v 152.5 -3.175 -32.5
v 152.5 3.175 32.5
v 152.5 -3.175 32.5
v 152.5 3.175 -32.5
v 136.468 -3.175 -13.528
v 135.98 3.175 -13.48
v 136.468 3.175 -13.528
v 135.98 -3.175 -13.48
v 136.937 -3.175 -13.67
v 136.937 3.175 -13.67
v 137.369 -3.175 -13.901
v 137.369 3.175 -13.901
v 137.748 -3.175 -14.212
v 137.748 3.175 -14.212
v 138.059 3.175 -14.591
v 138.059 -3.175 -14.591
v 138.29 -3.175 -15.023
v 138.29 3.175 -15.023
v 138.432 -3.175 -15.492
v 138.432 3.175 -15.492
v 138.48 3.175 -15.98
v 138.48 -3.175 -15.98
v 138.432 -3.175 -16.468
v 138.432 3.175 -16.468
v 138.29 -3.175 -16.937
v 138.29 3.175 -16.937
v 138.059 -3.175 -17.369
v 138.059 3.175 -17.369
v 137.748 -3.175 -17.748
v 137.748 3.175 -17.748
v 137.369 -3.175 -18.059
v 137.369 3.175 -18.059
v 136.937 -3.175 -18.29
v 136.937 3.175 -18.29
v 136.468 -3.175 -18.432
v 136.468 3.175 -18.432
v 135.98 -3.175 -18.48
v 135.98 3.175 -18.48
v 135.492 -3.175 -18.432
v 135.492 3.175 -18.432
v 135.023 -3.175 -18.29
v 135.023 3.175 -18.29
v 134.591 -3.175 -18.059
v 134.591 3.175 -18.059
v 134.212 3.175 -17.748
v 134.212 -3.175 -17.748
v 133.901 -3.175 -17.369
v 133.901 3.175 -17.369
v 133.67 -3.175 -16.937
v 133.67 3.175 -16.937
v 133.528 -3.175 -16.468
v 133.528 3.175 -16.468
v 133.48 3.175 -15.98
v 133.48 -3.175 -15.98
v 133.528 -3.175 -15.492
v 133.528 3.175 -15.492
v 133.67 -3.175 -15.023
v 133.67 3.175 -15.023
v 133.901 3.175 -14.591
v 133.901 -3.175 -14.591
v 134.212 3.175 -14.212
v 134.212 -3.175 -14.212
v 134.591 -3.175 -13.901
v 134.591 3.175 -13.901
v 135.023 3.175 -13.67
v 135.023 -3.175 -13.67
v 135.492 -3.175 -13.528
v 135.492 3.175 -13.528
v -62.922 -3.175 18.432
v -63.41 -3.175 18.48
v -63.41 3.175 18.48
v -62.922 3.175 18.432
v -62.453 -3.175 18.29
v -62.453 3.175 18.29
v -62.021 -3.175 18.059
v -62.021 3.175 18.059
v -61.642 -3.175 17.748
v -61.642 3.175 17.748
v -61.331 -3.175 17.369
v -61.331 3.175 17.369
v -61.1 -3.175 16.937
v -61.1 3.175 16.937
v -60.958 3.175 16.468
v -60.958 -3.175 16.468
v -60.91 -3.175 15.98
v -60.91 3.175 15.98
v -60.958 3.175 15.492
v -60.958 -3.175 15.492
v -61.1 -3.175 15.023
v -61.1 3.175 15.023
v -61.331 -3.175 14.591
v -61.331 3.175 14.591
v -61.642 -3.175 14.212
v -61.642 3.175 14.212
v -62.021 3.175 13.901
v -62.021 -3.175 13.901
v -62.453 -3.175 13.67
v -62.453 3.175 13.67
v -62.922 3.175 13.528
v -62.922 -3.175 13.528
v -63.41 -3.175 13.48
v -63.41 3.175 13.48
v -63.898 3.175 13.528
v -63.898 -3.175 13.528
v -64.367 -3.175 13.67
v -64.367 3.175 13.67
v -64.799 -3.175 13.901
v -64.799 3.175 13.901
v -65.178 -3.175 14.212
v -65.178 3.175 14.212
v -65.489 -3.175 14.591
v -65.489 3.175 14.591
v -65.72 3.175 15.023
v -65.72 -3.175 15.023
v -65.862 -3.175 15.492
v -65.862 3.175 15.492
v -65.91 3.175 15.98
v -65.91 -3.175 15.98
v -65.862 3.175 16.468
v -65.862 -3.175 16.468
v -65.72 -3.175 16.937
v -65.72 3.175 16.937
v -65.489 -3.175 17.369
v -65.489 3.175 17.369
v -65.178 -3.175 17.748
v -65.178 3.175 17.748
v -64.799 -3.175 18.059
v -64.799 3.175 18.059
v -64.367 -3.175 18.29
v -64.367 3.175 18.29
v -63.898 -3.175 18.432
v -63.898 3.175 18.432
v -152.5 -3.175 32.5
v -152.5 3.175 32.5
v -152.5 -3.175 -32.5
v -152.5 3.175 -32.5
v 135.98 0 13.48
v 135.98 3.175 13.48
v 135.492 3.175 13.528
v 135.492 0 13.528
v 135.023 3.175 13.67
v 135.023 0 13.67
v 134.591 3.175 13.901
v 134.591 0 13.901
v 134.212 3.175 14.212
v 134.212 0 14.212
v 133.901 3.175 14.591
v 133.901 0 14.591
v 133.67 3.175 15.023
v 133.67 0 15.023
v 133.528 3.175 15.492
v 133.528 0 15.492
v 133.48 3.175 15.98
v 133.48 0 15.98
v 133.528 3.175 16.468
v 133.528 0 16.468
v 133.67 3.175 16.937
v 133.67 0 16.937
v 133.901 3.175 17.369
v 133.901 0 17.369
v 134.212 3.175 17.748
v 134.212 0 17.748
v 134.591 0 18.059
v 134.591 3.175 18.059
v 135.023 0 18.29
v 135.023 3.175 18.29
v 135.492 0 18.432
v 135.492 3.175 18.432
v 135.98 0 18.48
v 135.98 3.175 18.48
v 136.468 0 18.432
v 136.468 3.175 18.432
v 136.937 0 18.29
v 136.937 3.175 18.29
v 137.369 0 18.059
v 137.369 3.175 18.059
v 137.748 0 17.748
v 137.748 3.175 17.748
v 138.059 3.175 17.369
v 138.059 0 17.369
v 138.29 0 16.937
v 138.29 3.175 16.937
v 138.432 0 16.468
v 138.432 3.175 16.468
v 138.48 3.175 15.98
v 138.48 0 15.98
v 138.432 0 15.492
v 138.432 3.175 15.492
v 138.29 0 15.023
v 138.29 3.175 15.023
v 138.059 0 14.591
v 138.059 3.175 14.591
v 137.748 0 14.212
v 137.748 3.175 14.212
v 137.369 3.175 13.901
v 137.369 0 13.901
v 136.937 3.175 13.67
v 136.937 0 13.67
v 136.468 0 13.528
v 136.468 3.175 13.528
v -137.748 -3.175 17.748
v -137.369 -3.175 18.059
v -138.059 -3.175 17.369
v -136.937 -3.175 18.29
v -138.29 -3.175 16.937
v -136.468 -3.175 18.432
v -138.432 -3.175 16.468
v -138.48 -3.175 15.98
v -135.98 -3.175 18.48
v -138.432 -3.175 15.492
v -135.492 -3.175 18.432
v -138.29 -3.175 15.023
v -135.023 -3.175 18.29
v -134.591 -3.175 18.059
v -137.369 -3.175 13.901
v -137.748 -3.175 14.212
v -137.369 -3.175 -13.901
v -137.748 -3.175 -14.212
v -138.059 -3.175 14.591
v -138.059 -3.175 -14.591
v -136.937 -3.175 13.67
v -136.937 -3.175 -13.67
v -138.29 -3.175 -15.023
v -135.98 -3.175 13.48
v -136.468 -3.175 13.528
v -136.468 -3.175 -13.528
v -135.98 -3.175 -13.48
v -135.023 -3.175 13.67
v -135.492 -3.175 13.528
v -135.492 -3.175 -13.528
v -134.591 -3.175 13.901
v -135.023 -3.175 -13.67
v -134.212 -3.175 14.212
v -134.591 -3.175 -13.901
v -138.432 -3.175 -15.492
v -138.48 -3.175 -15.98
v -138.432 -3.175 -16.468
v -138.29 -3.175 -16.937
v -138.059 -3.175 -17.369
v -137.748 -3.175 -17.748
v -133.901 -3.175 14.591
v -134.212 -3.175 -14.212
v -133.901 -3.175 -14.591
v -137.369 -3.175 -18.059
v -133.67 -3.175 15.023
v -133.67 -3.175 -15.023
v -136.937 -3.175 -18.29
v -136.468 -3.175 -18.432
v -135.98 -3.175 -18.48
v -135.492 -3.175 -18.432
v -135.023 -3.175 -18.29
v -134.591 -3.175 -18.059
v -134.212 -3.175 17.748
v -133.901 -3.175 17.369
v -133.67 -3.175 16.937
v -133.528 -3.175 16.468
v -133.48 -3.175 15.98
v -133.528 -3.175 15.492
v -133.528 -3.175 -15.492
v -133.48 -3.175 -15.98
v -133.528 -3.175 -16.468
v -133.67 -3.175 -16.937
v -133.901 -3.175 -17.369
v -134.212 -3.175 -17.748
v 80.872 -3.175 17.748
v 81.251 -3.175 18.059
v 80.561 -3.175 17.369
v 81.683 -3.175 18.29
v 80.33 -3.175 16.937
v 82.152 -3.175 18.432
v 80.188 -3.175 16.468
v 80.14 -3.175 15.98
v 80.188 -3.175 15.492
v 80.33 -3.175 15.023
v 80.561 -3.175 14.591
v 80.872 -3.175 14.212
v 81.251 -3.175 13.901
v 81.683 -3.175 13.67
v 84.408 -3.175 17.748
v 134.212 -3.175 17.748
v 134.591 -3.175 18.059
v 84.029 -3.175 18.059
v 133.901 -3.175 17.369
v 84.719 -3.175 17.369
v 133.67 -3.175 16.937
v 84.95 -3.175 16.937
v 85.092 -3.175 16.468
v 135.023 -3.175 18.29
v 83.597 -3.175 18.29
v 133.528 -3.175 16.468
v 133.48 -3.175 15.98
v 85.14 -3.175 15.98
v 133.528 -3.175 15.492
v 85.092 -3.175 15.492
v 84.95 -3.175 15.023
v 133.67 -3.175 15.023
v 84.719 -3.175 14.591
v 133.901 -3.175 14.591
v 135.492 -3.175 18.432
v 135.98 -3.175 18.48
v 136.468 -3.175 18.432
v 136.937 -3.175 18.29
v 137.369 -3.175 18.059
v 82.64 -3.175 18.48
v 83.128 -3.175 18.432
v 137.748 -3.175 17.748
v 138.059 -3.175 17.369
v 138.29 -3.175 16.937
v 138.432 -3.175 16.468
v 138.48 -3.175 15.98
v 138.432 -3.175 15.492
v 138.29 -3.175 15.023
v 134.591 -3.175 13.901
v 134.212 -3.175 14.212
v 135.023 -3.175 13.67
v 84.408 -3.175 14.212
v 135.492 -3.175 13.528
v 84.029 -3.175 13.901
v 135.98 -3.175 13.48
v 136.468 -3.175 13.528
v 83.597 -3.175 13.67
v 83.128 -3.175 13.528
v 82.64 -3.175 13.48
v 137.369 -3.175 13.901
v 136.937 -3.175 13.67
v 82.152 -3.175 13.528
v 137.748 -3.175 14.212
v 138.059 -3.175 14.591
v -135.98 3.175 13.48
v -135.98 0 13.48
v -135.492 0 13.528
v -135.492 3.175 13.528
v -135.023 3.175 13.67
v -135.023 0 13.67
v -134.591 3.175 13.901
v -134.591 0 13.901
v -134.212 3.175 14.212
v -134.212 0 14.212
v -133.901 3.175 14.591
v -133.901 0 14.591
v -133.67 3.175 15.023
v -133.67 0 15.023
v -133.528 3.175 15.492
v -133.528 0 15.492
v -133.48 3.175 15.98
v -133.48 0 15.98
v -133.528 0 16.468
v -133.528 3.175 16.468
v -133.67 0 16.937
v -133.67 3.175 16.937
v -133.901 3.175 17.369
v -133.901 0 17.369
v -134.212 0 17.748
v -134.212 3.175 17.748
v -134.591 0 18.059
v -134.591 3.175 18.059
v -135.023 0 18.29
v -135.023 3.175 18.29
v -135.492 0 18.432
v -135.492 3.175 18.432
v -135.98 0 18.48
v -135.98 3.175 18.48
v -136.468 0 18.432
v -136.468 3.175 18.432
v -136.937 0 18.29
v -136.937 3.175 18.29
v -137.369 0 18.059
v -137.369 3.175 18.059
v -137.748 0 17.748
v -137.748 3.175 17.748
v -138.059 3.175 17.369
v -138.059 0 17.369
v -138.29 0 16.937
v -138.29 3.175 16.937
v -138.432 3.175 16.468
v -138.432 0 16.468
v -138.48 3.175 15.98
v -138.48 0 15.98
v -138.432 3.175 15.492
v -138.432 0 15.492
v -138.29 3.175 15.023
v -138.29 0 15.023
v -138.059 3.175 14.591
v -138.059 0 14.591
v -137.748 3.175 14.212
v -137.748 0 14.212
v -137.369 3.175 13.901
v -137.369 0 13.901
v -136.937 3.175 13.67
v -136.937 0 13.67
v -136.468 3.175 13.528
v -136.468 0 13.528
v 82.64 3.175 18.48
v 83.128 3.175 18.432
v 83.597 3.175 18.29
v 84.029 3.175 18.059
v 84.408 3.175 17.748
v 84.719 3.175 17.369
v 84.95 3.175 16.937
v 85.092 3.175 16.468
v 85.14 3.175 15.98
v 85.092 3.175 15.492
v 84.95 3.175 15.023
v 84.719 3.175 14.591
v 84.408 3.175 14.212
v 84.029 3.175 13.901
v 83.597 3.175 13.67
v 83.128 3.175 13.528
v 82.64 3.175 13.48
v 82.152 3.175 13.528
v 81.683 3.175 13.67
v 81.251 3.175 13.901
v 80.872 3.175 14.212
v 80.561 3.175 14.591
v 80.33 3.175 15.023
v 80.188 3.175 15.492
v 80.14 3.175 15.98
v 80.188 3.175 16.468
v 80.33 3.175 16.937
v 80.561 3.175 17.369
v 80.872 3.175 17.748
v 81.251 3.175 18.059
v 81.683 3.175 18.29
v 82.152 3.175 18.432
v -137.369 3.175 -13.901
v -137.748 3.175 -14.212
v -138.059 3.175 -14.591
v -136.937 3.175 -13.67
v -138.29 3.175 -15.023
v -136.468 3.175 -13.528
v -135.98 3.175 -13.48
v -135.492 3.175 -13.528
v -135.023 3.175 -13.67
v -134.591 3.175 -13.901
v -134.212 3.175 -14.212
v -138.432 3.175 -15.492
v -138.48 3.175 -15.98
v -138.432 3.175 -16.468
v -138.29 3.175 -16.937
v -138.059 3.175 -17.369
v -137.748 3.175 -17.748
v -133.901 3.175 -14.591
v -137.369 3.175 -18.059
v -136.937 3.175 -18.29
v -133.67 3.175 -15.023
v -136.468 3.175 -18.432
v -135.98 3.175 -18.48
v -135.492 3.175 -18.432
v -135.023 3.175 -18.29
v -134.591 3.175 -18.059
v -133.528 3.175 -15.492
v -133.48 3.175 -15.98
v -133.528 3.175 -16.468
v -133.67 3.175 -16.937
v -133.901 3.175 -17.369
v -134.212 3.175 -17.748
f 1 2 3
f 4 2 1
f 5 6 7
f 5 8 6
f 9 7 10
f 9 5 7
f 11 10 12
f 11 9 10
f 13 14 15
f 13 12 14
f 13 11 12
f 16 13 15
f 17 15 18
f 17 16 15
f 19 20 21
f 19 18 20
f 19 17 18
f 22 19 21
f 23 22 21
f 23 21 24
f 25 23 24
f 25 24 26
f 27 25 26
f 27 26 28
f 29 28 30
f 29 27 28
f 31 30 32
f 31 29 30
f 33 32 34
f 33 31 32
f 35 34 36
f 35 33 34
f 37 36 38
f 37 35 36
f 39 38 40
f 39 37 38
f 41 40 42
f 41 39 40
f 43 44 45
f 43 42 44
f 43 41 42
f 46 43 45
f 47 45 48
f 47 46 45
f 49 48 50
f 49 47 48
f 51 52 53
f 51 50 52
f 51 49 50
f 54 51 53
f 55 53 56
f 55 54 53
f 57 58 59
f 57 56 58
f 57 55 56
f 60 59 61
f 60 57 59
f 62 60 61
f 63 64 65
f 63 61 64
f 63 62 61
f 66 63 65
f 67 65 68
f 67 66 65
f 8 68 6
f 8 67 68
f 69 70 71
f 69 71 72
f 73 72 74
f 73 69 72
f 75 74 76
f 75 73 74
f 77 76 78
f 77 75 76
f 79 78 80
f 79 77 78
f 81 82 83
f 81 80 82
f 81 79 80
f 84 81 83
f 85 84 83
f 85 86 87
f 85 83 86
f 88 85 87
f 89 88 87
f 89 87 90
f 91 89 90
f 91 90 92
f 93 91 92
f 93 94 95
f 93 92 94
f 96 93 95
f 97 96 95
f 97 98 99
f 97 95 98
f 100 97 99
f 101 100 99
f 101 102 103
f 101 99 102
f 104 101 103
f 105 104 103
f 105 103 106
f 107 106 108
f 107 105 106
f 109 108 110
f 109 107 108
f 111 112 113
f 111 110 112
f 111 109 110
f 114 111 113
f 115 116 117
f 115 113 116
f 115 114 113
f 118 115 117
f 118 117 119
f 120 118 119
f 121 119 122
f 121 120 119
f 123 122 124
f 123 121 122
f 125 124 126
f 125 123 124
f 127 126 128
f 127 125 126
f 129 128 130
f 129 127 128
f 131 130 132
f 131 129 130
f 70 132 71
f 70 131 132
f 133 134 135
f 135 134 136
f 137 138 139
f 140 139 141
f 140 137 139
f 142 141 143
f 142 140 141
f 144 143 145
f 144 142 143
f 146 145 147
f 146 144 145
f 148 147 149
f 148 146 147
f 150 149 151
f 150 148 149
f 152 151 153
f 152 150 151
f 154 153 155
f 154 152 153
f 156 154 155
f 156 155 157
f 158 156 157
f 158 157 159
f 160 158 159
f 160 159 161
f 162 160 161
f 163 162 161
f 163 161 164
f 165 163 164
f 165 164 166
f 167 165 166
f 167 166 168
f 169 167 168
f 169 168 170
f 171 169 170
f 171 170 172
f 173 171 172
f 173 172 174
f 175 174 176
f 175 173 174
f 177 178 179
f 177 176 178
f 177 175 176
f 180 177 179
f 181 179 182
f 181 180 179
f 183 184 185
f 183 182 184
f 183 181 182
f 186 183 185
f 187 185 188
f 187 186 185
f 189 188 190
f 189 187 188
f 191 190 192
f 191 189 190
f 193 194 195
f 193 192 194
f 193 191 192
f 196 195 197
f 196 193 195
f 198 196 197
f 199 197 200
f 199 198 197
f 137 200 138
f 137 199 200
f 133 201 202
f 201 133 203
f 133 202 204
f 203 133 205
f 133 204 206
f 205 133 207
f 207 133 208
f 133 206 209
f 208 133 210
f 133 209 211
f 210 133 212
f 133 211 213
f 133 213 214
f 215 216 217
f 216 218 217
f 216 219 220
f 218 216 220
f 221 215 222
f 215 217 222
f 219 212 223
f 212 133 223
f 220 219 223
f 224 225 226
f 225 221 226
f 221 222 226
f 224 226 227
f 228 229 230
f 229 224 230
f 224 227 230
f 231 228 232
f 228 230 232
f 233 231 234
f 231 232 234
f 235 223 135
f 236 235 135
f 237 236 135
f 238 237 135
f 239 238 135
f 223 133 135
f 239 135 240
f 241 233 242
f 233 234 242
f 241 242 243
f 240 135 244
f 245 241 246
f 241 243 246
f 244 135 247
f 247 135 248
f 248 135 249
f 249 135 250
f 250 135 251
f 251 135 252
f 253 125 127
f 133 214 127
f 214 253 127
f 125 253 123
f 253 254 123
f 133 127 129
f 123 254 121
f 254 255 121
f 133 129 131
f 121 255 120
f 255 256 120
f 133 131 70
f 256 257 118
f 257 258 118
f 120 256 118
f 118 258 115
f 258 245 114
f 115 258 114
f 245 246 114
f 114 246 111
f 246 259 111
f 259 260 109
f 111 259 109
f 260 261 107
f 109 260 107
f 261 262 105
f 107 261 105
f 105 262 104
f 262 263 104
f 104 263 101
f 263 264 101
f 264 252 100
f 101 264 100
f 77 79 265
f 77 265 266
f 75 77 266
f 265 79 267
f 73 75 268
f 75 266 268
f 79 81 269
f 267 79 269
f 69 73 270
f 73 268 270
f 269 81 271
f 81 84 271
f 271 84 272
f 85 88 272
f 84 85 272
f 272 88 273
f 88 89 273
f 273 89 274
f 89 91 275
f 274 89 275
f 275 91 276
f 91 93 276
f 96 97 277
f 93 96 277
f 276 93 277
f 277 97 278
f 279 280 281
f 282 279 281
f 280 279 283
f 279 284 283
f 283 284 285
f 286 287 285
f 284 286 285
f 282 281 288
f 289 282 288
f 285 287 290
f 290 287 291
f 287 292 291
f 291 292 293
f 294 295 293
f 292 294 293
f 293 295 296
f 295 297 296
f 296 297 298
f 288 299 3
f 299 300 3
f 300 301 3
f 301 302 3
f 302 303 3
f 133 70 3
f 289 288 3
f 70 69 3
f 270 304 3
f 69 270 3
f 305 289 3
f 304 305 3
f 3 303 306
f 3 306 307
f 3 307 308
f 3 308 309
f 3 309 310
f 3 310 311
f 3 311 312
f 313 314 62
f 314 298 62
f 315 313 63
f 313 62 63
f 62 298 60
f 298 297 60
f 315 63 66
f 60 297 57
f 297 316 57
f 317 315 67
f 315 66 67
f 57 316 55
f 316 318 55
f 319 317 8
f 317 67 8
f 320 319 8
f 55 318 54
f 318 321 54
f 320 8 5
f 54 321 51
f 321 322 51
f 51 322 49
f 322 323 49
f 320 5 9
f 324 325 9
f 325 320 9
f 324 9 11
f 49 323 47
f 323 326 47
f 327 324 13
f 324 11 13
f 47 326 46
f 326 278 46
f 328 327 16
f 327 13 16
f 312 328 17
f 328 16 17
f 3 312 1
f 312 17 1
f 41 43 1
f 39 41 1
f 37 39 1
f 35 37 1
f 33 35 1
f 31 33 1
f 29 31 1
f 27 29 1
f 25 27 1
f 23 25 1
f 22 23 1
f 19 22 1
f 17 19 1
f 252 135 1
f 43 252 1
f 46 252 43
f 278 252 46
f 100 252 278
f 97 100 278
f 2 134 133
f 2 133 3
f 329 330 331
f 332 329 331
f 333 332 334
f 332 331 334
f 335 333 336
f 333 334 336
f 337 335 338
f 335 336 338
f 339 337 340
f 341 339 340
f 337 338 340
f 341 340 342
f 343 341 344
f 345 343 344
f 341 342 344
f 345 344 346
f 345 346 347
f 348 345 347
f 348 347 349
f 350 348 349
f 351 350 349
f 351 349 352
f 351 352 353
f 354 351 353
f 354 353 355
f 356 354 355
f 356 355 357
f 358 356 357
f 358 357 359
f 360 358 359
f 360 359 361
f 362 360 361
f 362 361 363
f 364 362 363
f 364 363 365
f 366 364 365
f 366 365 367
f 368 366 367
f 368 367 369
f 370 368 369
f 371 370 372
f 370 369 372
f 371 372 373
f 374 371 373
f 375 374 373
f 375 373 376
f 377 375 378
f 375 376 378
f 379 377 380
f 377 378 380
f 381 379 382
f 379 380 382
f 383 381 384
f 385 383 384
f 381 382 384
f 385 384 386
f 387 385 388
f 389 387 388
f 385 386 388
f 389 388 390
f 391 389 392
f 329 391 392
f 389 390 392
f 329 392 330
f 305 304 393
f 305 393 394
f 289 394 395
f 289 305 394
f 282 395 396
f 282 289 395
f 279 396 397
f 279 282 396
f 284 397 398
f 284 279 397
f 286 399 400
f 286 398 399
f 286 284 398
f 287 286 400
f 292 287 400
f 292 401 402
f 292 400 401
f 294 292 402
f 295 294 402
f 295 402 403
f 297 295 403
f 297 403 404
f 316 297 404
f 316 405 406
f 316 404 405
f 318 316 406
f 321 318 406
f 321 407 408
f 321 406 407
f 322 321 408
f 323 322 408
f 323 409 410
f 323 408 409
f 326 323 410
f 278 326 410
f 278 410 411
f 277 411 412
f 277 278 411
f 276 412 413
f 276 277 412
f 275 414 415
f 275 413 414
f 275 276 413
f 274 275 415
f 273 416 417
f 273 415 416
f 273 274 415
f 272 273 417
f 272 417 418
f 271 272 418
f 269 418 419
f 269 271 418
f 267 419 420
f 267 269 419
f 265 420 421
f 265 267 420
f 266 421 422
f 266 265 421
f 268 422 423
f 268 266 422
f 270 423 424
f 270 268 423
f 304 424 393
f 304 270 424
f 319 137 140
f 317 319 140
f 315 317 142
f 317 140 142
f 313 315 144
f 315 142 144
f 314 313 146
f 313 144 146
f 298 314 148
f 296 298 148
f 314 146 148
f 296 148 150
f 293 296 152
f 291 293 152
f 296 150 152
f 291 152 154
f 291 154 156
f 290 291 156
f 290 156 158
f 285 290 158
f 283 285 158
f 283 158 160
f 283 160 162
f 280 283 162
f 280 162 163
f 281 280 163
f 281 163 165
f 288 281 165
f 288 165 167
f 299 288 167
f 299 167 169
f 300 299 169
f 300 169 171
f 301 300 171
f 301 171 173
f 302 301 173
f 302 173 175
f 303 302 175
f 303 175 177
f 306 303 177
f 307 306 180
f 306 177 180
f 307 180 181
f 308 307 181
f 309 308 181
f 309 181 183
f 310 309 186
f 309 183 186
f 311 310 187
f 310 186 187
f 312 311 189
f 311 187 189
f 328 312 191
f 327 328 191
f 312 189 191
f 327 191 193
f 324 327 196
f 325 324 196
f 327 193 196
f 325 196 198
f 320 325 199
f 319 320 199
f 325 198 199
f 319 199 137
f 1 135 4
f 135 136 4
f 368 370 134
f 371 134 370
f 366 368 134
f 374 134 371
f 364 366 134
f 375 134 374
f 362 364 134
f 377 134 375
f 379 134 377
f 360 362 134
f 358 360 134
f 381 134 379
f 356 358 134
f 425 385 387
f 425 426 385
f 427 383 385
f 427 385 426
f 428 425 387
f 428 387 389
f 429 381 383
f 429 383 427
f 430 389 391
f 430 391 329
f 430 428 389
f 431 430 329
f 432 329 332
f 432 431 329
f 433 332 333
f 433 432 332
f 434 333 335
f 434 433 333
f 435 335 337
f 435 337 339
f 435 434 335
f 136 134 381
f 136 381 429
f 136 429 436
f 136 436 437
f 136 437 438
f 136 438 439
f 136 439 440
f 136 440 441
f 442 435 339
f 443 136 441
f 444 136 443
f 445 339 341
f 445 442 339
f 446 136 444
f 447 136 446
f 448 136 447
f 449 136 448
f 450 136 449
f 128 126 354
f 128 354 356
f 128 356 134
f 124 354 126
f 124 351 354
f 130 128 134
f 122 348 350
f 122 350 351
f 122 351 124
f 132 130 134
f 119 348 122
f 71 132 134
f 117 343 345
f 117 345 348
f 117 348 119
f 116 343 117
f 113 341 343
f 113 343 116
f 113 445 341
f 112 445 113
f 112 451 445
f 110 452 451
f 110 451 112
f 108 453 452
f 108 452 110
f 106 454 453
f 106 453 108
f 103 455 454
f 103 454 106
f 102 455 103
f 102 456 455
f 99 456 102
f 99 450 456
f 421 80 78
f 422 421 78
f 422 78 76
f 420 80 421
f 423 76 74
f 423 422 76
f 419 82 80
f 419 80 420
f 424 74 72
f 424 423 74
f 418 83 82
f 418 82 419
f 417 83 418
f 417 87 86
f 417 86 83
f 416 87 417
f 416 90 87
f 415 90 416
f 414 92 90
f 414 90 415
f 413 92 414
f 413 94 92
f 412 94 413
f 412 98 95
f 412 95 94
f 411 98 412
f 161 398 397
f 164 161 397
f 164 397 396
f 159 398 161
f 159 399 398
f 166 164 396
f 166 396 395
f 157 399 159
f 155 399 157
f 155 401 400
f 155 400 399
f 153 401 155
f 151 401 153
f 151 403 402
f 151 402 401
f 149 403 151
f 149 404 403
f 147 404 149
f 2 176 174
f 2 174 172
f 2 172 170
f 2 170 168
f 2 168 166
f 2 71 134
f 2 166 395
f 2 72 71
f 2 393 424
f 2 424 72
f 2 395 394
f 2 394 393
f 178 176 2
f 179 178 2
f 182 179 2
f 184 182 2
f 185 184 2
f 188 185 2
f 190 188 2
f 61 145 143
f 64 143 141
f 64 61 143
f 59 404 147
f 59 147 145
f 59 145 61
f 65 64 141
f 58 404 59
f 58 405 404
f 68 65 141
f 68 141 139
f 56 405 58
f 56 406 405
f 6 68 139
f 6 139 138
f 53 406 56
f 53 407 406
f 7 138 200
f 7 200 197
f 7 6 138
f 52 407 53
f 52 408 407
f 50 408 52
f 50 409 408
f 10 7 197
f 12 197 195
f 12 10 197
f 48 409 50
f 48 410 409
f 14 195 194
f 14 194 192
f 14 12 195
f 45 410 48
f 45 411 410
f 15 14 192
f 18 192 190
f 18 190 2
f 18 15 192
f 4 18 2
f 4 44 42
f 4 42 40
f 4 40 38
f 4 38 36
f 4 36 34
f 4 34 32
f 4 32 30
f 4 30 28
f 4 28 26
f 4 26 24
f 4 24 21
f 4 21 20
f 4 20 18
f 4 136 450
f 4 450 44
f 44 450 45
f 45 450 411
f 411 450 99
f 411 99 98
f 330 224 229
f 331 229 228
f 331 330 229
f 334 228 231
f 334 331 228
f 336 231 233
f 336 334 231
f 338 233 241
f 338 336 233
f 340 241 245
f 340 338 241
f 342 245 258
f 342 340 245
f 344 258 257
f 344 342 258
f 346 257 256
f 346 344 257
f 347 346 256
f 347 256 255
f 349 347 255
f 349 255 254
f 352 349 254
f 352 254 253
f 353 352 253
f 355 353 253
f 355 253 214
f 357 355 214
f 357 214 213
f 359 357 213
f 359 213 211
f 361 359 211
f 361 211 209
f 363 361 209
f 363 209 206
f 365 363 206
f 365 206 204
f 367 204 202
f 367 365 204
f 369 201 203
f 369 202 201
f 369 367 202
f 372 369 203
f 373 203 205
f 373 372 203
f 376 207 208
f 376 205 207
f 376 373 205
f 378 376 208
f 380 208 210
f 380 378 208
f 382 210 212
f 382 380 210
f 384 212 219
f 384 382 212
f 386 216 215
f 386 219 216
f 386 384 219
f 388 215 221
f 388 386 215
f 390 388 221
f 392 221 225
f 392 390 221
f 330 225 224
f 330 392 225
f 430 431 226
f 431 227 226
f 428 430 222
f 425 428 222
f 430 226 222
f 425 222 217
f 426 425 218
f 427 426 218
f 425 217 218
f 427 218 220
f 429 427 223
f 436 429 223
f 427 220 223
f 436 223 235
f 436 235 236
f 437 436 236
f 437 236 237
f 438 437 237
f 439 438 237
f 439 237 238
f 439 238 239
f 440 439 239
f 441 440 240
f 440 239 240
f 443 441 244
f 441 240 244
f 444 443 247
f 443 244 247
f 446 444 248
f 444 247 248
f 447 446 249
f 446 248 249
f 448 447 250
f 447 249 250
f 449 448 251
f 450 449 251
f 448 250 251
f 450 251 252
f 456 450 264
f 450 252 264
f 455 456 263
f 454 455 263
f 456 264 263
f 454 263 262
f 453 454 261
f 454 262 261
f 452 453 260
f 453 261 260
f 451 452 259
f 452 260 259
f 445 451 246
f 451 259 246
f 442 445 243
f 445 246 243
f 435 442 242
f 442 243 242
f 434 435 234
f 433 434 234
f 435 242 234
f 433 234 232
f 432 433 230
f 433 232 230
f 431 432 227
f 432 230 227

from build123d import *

# Parameters (mm, degrees)
SKETCH1_W               = 305
SKETCH1_H               = 65
BOSS_EXTRUDE1_DEPTH     = 3.175
SKETCH4_R               = 2.5
CUT_EXTRUDE2_DEPTH      = 159.40243251
CUT_EXTRUDE3_DEPTH      = 157.053908955
CUT_EXTRUDE3_DEPTH_BACK = 157.053908955
SKETCH5_R               = 2.5


with BuildPart() as part:
    # Sketch1 → Boss-Extrude1 (new, symmetric)
    with BuildSketch(Plane(origin=(0, 0, 0), x_dir=(1, 0, 0), z_dir=(0, 1, 0))):
        Rectangle(SKETCH1_W, SKETCH1_H)
    extrude(amount=BOSS_EXTRUDE1_DEPTH, both=True)

    # Sketch4 → Cut-Extrude2 (cut, symmetric)
    with BuildSketch(Plane(origin=(-2.5, 0, 0), x_dir=(-1, 0, 0), z_dir=(0, -1, 0))):
        with Locations(Location((133.48, -15.98, 0), (0, 0, 90))):
            Circle(SKETCH4_R)
        with Locations(Location((133.48, 15.98, 0), (0, 0, 270))):
            Circle(SKETCH4_R)
    cut_extrude2 = extrude(amount=CUT_EXTRUDE2_DEPTH, both=True, mode=Mode.SUBTRACT)

    # Mirror2: Cut-Extrude2 across plane
    add(cut_extrude2.mirror(Plane(origin=(0, 0, 0), x_dir=(0, 0, 1), z_dir=(1, 0, 0))), mode=Mode.SUBTRACT)

    # Sketch5 → Cut-Extrude3 (cut, two sides: drawn at the far end of the back side and taken through both)
    with BuildSketch(Plane(origin=(0, 3.175, 0), x_dir=(1, 0, 0), z_dir=(0, 1, 0)).offset(-CUT_EXTRUDE3_DEPTH_BACK)):
        with Locations(Location((82.64, -15.98, 0), (0, 0, 270))):
            Circle(SKETCH5_R)
        with Locations(Location((-63.41, -15.98, 0), (0, 0, 270))):
            Circle(SKETCH5_R)
    extrude(amount=CUT_EXTRUDE3_DEPTH + CUT_EXTRUDE3_DEPTH_BACK, mode=Mode.SUBTRACT)


solid = part.part
